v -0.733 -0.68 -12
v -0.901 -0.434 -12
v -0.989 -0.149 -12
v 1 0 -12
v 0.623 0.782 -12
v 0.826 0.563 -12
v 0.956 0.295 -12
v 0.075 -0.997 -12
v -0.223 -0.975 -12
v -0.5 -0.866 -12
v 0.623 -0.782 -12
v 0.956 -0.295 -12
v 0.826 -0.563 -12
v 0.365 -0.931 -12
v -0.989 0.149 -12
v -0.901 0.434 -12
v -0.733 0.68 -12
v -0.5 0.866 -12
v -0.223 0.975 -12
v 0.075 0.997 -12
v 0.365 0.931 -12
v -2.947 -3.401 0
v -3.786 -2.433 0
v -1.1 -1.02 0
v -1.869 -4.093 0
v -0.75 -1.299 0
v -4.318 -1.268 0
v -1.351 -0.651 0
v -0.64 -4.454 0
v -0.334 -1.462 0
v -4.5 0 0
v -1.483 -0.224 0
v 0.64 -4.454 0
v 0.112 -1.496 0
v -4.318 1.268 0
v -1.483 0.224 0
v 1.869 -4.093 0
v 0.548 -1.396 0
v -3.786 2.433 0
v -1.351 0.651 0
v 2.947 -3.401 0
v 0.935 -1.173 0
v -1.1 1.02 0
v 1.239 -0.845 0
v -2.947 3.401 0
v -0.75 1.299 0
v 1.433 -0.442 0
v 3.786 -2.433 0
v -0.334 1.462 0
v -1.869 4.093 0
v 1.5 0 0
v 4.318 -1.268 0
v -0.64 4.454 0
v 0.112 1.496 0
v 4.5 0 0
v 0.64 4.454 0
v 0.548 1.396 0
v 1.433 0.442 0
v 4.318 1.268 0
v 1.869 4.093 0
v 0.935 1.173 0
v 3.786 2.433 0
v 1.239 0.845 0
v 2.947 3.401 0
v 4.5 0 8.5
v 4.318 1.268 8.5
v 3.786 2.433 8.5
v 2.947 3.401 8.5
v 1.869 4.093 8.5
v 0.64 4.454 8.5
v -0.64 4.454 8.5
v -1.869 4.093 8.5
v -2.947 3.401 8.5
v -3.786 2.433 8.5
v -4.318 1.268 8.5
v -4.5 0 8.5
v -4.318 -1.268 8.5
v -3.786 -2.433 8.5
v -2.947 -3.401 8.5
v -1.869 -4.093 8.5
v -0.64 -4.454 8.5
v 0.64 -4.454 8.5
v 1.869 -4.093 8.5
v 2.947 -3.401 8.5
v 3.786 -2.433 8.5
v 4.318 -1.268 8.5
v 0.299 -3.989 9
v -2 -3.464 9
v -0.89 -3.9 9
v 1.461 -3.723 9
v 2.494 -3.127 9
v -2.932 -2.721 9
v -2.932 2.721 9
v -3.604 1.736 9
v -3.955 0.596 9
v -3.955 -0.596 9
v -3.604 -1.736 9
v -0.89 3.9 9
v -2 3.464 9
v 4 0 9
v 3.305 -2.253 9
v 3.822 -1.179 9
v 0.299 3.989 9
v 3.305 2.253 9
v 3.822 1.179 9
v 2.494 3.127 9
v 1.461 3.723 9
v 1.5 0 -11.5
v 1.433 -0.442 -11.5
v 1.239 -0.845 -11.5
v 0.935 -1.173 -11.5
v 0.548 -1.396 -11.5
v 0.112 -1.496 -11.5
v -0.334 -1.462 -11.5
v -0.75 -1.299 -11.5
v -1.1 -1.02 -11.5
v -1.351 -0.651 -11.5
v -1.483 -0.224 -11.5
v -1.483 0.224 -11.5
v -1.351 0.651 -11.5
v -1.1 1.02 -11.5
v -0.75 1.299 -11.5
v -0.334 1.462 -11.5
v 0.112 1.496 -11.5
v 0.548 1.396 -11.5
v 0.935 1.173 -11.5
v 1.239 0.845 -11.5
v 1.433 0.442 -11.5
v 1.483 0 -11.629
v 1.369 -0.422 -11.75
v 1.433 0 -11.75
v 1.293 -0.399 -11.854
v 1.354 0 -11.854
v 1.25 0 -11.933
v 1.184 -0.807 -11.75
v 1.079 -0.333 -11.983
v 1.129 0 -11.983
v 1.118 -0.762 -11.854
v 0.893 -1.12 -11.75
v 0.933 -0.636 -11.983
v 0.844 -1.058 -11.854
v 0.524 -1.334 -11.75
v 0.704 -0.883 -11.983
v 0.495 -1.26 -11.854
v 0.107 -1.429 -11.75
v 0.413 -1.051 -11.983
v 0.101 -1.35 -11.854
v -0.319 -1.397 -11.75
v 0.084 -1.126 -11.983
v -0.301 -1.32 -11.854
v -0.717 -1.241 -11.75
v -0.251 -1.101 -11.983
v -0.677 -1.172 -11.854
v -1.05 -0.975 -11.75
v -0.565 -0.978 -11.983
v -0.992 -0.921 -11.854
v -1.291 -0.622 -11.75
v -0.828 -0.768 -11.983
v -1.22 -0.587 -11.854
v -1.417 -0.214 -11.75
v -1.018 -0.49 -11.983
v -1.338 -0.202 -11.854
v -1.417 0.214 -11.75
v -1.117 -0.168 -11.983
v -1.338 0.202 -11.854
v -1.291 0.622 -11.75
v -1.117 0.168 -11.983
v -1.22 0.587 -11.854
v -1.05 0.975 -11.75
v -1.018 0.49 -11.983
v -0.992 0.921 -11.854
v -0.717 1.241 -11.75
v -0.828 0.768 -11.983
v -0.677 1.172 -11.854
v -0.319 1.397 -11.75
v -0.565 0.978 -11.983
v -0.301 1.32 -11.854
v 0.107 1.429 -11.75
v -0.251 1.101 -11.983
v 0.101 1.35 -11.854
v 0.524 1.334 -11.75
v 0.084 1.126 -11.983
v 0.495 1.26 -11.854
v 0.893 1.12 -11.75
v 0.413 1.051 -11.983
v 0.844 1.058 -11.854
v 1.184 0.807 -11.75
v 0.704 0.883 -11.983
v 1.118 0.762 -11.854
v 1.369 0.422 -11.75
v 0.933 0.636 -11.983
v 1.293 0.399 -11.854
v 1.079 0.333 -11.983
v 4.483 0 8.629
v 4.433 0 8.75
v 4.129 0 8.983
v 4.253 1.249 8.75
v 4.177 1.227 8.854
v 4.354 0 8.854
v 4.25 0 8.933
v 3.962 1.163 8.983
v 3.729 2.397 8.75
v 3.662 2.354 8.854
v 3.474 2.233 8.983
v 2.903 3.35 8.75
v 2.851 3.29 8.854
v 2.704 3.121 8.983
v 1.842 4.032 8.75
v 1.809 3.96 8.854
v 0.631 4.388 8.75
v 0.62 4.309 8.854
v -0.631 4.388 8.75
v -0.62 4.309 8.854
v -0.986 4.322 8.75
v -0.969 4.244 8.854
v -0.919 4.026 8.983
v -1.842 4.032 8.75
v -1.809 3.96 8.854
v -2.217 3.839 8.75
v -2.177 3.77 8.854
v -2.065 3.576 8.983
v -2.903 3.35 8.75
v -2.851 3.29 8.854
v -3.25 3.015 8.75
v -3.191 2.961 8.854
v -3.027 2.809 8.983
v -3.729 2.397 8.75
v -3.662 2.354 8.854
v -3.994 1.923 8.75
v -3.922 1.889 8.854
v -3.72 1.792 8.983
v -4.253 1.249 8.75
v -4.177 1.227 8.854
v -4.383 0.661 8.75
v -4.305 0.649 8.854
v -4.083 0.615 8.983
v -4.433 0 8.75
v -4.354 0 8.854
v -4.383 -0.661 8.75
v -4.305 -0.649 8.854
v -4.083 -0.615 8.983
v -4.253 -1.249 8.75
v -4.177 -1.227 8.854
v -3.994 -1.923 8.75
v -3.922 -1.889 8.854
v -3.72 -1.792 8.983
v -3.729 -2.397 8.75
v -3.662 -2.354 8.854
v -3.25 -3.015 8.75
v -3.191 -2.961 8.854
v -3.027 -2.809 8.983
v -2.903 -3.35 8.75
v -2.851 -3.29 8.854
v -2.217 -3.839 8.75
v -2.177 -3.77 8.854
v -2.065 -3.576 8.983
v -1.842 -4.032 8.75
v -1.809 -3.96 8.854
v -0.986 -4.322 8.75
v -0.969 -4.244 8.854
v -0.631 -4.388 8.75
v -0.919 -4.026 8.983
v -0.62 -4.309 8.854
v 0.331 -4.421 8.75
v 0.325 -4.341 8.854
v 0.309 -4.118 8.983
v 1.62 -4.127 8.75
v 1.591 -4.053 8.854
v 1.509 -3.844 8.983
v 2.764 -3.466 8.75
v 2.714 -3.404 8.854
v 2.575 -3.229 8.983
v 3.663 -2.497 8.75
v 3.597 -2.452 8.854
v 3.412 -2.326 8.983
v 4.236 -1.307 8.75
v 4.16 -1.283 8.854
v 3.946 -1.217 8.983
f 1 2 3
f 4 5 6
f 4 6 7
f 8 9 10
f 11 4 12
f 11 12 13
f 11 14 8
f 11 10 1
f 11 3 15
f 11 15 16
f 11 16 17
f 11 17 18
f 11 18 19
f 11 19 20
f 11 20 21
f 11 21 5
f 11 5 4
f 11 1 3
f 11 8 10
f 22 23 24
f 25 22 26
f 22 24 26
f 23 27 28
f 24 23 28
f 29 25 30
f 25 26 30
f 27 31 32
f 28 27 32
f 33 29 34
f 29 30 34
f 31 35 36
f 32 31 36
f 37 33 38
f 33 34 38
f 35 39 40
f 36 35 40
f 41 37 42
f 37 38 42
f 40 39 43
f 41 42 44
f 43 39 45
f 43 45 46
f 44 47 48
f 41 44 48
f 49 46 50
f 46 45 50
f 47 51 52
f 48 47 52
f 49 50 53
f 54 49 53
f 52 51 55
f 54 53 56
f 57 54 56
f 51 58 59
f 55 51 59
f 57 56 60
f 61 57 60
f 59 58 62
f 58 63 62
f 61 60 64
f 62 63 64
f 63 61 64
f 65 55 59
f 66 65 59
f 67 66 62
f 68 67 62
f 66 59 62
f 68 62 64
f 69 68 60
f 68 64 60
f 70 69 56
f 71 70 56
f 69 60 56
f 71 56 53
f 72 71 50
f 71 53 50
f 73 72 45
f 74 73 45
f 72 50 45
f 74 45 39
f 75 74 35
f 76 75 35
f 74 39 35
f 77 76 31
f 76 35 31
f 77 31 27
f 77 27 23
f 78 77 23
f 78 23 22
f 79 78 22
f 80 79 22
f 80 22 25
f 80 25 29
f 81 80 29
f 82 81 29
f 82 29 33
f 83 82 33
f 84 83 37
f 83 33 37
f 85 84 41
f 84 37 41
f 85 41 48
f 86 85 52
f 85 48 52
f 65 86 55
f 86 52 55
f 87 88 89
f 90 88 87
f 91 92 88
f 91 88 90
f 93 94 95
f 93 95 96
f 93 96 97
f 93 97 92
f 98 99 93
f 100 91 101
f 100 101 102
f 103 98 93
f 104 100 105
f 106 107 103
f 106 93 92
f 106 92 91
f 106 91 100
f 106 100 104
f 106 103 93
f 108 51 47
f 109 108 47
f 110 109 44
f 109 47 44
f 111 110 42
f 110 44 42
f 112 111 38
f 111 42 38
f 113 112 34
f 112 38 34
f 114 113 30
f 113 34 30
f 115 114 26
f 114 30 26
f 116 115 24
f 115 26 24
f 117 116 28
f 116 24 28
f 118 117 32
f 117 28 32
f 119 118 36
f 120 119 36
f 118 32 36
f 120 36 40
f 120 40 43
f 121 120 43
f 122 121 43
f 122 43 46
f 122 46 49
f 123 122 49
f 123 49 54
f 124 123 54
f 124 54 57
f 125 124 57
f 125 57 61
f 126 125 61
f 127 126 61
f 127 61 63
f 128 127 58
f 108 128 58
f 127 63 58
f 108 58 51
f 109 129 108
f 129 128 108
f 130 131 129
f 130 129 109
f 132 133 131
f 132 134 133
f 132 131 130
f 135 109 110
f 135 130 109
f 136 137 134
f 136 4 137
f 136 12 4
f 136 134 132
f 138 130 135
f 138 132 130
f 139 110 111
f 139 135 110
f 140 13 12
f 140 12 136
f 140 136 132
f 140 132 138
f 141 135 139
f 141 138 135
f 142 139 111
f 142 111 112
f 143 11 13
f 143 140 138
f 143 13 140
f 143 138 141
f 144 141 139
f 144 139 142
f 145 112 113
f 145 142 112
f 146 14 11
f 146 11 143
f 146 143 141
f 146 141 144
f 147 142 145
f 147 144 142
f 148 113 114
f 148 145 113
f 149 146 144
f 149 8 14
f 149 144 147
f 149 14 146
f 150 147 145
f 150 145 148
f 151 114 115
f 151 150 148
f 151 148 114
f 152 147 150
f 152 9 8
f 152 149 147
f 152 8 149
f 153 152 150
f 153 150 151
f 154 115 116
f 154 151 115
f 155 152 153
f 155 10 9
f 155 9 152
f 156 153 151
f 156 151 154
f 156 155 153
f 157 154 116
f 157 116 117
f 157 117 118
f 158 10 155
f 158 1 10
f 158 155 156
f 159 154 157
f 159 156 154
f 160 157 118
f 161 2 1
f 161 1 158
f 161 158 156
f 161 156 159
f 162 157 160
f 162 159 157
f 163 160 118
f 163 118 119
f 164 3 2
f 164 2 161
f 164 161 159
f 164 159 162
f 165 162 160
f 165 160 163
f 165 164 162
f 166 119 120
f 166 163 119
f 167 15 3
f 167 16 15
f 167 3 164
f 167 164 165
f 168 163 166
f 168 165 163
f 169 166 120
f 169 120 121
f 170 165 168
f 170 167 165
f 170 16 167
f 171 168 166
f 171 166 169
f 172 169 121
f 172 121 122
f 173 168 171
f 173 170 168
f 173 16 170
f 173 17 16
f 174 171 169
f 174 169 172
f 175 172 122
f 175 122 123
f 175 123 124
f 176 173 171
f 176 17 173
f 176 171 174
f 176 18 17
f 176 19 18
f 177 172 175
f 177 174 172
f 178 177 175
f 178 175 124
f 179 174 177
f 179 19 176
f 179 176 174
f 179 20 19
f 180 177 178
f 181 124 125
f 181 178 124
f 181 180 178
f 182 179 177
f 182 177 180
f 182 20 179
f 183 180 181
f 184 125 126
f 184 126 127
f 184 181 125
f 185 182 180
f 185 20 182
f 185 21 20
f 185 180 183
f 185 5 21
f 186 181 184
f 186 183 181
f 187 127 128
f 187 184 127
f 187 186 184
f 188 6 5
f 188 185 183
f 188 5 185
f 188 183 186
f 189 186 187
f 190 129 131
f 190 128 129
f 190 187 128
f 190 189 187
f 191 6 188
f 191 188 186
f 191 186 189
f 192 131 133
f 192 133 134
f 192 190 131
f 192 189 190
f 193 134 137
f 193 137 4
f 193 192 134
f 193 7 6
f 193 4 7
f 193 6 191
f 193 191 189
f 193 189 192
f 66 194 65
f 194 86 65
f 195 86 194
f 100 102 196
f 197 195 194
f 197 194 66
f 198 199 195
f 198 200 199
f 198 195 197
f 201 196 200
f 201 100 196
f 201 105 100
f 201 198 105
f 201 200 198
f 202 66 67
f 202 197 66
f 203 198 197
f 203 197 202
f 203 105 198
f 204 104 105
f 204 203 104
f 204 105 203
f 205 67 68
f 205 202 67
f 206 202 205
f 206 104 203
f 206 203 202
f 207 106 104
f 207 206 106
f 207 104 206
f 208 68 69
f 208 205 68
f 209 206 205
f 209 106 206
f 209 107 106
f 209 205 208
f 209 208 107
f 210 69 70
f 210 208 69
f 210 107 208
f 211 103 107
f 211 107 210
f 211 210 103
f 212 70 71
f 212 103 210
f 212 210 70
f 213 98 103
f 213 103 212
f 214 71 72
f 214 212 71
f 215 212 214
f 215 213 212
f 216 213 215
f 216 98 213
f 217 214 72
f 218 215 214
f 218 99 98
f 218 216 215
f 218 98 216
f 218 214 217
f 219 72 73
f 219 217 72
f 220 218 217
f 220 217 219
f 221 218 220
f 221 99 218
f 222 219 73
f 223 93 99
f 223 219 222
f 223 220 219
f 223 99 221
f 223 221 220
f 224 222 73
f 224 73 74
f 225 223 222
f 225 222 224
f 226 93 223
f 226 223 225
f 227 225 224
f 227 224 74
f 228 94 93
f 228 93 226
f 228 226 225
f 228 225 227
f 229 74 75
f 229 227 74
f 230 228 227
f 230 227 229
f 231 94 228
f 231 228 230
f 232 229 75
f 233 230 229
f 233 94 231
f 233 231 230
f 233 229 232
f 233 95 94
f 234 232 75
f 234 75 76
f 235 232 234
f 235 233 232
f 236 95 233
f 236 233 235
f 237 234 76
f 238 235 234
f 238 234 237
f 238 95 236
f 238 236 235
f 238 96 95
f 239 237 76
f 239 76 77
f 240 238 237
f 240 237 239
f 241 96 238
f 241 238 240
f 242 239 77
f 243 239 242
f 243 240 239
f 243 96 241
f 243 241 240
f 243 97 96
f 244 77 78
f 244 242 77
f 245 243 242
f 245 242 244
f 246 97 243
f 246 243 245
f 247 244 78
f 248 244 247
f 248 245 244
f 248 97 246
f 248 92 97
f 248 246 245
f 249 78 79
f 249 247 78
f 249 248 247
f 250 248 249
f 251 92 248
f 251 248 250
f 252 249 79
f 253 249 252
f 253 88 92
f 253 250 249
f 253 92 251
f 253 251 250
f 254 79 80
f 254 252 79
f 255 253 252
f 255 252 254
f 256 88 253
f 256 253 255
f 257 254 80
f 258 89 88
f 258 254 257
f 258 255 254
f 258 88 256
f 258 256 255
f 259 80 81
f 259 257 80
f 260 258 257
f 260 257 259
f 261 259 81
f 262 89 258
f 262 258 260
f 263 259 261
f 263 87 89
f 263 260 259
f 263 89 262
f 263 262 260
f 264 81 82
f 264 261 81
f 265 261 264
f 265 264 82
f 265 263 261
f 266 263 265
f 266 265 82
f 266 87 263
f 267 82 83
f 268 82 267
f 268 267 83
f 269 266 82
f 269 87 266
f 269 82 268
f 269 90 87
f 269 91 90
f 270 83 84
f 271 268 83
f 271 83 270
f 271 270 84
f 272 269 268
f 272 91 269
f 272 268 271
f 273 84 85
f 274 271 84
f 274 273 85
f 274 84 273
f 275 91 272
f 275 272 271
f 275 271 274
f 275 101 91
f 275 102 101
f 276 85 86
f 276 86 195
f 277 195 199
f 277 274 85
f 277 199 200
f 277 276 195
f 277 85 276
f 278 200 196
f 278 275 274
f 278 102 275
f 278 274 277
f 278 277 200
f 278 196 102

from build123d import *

# Parameters (mm, degrees)
F1_R     = 4.5
F2_DEPTH = 9
F3_R     = 1.5
F4_DEPTH = 12
F0_R     = 0.5


with BuildPart() as f2:
    # F1 (on Top) → F2 (new body)
    with BuildSketch(Plane.XY):
        Circle(F1_R)
    extrude(amount=F2_DEPTH)

    # F3 (on face) → F4 (join)
    with BuildSketch(Plane(origin=(0, 0, 0), x_dir=(1, 0, 0), z_dir=(0, 0, -1))):
        Circle(F3_R)
    extrude(amount=F4_DEPTH)

    # F0
    f0_edges = [f2.edges().sort_by_distance(p)[0] for p in [
        (-4.5, 0, 9),
        (-1.5, 0, -12),
    ]]
    fillet(f0_edges, radius=F0_R)


solid = f2.part
